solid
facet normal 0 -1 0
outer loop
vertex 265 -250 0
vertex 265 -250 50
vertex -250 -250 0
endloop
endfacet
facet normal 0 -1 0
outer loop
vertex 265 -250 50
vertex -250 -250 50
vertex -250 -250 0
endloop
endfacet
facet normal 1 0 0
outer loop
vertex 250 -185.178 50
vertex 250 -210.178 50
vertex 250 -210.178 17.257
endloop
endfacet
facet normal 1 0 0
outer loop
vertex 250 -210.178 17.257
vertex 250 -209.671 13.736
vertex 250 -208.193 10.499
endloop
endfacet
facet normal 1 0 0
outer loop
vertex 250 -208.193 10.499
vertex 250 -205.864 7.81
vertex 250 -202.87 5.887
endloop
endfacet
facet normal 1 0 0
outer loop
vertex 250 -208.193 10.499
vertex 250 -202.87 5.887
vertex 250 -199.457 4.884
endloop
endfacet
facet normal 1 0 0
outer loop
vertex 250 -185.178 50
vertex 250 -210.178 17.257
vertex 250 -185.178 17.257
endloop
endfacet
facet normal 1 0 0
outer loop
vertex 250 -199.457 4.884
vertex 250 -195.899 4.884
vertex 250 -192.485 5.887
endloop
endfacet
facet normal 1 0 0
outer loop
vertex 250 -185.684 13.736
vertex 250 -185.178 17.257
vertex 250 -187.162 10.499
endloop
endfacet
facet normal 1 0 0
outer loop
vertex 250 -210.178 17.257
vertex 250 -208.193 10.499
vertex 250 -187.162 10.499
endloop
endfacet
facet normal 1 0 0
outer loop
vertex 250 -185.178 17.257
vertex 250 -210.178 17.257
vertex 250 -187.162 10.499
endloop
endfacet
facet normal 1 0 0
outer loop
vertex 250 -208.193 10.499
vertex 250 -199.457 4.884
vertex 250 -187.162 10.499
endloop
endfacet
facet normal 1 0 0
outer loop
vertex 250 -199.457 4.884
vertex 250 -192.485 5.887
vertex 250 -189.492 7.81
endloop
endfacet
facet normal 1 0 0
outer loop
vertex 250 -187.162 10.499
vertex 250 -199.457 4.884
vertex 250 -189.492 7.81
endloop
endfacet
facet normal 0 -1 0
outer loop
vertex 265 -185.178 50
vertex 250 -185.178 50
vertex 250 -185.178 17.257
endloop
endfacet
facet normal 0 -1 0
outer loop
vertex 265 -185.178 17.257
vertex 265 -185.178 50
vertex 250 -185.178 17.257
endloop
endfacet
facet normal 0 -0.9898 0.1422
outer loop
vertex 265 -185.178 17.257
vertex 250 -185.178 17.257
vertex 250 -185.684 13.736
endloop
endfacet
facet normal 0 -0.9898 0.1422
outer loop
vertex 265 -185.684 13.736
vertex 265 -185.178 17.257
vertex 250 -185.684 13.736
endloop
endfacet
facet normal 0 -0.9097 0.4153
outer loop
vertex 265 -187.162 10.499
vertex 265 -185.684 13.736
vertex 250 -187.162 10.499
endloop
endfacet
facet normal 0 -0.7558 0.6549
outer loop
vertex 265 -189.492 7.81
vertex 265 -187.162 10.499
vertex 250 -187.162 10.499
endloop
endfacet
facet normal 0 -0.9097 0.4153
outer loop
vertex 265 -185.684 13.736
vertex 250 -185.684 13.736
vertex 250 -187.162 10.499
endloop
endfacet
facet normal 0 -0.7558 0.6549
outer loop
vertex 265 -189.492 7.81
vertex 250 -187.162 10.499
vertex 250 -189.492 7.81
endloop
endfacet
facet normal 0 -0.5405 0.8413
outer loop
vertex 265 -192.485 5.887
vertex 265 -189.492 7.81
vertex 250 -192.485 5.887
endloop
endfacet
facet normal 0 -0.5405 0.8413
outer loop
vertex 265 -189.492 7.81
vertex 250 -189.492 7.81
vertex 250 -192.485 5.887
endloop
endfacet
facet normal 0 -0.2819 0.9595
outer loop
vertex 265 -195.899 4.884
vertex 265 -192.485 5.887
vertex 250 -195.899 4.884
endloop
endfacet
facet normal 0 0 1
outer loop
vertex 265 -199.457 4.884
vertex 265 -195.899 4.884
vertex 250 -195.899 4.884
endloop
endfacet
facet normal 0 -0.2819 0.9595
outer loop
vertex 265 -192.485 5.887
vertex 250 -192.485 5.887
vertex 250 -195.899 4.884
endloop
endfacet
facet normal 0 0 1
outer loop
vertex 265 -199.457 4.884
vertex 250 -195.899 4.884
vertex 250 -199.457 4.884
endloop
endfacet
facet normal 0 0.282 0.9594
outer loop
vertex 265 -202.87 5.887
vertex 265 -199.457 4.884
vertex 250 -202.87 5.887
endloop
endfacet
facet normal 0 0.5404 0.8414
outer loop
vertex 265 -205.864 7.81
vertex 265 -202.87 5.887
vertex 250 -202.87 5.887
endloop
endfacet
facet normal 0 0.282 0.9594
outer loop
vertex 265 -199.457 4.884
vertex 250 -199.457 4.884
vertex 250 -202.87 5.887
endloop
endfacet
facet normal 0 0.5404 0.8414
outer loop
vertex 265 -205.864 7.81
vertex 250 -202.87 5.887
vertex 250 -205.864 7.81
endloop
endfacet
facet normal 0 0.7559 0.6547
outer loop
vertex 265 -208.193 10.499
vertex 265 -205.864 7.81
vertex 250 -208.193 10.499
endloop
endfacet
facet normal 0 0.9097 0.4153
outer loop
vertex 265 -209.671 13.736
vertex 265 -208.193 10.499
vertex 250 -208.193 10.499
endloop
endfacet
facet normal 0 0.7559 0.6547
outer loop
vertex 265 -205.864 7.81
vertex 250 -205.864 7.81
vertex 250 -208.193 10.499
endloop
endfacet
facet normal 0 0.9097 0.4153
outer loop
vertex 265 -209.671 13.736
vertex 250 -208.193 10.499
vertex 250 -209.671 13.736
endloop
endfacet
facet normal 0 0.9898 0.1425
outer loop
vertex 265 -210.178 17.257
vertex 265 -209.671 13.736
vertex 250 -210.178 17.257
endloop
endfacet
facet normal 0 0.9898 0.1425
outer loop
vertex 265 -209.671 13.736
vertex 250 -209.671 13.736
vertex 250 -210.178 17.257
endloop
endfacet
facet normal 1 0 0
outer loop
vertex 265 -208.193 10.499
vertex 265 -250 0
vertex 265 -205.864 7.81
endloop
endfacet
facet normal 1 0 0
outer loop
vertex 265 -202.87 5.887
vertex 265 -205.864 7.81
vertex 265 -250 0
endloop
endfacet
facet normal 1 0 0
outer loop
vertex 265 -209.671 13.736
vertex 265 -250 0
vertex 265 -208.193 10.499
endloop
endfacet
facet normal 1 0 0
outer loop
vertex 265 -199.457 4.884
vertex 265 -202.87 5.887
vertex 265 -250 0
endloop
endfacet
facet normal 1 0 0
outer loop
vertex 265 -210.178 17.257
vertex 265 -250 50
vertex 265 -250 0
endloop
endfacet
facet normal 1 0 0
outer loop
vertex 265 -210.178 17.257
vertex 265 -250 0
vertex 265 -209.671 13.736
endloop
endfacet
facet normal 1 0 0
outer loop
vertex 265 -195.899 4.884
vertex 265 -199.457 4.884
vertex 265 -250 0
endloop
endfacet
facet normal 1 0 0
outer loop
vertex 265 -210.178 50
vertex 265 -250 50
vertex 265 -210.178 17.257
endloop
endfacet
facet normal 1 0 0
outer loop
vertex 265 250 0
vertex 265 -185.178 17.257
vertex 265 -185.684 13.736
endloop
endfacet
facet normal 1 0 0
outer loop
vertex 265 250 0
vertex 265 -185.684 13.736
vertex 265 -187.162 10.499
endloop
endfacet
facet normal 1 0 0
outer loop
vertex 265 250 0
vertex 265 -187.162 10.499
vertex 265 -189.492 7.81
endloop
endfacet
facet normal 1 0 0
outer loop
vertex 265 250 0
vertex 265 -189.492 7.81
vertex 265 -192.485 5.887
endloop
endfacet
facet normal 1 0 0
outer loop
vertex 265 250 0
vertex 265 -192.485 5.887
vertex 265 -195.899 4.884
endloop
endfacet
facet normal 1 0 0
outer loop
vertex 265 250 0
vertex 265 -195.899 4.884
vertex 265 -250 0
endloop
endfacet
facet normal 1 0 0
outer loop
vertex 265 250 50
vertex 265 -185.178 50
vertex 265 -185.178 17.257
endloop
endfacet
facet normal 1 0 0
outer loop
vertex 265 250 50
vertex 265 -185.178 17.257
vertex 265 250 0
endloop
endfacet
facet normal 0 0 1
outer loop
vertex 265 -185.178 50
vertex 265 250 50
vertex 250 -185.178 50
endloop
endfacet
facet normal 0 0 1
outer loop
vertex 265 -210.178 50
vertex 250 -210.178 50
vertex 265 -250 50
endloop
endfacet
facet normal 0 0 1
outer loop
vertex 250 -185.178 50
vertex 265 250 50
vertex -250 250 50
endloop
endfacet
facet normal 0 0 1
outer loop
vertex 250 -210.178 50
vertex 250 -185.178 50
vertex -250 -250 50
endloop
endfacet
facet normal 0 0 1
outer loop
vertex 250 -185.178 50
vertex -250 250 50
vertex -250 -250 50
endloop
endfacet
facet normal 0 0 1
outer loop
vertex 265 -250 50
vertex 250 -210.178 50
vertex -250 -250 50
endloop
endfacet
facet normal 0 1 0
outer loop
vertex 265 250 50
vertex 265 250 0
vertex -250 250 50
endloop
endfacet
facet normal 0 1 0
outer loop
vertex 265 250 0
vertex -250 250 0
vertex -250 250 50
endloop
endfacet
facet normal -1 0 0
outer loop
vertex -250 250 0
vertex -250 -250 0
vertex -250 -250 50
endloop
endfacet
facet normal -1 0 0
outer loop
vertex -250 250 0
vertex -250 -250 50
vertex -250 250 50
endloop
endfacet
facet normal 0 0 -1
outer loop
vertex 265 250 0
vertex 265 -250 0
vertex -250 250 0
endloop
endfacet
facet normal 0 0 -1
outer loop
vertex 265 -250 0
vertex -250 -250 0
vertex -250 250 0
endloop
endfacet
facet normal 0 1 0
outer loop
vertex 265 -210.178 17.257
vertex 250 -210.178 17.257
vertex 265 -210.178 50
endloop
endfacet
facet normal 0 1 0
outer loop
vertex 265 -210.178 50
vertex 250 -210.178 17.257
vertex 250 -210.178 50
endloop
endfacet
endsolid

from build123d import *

# Parameters (mm, degrees)
F0_W     = 500
F0_H     = 500
F1_DEPTH = 50
F3_DEPTH = 15


with BuildPart() as f1:
    # F0 (on Top) → F1 (new body)
    with BuildSketch(Plane.XY):
        Rectangle(F0_W, F0_H)
    extrude(amount=F1_DEPTH)

    # F2 (on face) → F3 (join)
    with BuildSketch(Plane.YZ.offset(250)):
        with BuildLine():
            Line((-185.177746, 42.257256), (-185.177746, 17.257256))
            ThreePointArc((-185.177746, 17.257256), (-197.677746, 4.757256), (-210.177746, 17.257256))
            Line((-210.177746, 17.257256), (-210.177746, 42.257256))
            Line((-210.177746, 42.257256), (-210.177746, 50))
            Line((-210.177746, 50), (-250, 50))
            Line((-250, 50), (-250, 0))
            Line((-250, 0), (250, 0))
            Line((250, 0), (250, 50))
            Line((250, 50), (-185.177746, 50))
            Line((-185.177746, 50), (-185.177746, 42.257256))
        make_face()
    extrude(amount=F3_DEPTH)


solid = f1.part
